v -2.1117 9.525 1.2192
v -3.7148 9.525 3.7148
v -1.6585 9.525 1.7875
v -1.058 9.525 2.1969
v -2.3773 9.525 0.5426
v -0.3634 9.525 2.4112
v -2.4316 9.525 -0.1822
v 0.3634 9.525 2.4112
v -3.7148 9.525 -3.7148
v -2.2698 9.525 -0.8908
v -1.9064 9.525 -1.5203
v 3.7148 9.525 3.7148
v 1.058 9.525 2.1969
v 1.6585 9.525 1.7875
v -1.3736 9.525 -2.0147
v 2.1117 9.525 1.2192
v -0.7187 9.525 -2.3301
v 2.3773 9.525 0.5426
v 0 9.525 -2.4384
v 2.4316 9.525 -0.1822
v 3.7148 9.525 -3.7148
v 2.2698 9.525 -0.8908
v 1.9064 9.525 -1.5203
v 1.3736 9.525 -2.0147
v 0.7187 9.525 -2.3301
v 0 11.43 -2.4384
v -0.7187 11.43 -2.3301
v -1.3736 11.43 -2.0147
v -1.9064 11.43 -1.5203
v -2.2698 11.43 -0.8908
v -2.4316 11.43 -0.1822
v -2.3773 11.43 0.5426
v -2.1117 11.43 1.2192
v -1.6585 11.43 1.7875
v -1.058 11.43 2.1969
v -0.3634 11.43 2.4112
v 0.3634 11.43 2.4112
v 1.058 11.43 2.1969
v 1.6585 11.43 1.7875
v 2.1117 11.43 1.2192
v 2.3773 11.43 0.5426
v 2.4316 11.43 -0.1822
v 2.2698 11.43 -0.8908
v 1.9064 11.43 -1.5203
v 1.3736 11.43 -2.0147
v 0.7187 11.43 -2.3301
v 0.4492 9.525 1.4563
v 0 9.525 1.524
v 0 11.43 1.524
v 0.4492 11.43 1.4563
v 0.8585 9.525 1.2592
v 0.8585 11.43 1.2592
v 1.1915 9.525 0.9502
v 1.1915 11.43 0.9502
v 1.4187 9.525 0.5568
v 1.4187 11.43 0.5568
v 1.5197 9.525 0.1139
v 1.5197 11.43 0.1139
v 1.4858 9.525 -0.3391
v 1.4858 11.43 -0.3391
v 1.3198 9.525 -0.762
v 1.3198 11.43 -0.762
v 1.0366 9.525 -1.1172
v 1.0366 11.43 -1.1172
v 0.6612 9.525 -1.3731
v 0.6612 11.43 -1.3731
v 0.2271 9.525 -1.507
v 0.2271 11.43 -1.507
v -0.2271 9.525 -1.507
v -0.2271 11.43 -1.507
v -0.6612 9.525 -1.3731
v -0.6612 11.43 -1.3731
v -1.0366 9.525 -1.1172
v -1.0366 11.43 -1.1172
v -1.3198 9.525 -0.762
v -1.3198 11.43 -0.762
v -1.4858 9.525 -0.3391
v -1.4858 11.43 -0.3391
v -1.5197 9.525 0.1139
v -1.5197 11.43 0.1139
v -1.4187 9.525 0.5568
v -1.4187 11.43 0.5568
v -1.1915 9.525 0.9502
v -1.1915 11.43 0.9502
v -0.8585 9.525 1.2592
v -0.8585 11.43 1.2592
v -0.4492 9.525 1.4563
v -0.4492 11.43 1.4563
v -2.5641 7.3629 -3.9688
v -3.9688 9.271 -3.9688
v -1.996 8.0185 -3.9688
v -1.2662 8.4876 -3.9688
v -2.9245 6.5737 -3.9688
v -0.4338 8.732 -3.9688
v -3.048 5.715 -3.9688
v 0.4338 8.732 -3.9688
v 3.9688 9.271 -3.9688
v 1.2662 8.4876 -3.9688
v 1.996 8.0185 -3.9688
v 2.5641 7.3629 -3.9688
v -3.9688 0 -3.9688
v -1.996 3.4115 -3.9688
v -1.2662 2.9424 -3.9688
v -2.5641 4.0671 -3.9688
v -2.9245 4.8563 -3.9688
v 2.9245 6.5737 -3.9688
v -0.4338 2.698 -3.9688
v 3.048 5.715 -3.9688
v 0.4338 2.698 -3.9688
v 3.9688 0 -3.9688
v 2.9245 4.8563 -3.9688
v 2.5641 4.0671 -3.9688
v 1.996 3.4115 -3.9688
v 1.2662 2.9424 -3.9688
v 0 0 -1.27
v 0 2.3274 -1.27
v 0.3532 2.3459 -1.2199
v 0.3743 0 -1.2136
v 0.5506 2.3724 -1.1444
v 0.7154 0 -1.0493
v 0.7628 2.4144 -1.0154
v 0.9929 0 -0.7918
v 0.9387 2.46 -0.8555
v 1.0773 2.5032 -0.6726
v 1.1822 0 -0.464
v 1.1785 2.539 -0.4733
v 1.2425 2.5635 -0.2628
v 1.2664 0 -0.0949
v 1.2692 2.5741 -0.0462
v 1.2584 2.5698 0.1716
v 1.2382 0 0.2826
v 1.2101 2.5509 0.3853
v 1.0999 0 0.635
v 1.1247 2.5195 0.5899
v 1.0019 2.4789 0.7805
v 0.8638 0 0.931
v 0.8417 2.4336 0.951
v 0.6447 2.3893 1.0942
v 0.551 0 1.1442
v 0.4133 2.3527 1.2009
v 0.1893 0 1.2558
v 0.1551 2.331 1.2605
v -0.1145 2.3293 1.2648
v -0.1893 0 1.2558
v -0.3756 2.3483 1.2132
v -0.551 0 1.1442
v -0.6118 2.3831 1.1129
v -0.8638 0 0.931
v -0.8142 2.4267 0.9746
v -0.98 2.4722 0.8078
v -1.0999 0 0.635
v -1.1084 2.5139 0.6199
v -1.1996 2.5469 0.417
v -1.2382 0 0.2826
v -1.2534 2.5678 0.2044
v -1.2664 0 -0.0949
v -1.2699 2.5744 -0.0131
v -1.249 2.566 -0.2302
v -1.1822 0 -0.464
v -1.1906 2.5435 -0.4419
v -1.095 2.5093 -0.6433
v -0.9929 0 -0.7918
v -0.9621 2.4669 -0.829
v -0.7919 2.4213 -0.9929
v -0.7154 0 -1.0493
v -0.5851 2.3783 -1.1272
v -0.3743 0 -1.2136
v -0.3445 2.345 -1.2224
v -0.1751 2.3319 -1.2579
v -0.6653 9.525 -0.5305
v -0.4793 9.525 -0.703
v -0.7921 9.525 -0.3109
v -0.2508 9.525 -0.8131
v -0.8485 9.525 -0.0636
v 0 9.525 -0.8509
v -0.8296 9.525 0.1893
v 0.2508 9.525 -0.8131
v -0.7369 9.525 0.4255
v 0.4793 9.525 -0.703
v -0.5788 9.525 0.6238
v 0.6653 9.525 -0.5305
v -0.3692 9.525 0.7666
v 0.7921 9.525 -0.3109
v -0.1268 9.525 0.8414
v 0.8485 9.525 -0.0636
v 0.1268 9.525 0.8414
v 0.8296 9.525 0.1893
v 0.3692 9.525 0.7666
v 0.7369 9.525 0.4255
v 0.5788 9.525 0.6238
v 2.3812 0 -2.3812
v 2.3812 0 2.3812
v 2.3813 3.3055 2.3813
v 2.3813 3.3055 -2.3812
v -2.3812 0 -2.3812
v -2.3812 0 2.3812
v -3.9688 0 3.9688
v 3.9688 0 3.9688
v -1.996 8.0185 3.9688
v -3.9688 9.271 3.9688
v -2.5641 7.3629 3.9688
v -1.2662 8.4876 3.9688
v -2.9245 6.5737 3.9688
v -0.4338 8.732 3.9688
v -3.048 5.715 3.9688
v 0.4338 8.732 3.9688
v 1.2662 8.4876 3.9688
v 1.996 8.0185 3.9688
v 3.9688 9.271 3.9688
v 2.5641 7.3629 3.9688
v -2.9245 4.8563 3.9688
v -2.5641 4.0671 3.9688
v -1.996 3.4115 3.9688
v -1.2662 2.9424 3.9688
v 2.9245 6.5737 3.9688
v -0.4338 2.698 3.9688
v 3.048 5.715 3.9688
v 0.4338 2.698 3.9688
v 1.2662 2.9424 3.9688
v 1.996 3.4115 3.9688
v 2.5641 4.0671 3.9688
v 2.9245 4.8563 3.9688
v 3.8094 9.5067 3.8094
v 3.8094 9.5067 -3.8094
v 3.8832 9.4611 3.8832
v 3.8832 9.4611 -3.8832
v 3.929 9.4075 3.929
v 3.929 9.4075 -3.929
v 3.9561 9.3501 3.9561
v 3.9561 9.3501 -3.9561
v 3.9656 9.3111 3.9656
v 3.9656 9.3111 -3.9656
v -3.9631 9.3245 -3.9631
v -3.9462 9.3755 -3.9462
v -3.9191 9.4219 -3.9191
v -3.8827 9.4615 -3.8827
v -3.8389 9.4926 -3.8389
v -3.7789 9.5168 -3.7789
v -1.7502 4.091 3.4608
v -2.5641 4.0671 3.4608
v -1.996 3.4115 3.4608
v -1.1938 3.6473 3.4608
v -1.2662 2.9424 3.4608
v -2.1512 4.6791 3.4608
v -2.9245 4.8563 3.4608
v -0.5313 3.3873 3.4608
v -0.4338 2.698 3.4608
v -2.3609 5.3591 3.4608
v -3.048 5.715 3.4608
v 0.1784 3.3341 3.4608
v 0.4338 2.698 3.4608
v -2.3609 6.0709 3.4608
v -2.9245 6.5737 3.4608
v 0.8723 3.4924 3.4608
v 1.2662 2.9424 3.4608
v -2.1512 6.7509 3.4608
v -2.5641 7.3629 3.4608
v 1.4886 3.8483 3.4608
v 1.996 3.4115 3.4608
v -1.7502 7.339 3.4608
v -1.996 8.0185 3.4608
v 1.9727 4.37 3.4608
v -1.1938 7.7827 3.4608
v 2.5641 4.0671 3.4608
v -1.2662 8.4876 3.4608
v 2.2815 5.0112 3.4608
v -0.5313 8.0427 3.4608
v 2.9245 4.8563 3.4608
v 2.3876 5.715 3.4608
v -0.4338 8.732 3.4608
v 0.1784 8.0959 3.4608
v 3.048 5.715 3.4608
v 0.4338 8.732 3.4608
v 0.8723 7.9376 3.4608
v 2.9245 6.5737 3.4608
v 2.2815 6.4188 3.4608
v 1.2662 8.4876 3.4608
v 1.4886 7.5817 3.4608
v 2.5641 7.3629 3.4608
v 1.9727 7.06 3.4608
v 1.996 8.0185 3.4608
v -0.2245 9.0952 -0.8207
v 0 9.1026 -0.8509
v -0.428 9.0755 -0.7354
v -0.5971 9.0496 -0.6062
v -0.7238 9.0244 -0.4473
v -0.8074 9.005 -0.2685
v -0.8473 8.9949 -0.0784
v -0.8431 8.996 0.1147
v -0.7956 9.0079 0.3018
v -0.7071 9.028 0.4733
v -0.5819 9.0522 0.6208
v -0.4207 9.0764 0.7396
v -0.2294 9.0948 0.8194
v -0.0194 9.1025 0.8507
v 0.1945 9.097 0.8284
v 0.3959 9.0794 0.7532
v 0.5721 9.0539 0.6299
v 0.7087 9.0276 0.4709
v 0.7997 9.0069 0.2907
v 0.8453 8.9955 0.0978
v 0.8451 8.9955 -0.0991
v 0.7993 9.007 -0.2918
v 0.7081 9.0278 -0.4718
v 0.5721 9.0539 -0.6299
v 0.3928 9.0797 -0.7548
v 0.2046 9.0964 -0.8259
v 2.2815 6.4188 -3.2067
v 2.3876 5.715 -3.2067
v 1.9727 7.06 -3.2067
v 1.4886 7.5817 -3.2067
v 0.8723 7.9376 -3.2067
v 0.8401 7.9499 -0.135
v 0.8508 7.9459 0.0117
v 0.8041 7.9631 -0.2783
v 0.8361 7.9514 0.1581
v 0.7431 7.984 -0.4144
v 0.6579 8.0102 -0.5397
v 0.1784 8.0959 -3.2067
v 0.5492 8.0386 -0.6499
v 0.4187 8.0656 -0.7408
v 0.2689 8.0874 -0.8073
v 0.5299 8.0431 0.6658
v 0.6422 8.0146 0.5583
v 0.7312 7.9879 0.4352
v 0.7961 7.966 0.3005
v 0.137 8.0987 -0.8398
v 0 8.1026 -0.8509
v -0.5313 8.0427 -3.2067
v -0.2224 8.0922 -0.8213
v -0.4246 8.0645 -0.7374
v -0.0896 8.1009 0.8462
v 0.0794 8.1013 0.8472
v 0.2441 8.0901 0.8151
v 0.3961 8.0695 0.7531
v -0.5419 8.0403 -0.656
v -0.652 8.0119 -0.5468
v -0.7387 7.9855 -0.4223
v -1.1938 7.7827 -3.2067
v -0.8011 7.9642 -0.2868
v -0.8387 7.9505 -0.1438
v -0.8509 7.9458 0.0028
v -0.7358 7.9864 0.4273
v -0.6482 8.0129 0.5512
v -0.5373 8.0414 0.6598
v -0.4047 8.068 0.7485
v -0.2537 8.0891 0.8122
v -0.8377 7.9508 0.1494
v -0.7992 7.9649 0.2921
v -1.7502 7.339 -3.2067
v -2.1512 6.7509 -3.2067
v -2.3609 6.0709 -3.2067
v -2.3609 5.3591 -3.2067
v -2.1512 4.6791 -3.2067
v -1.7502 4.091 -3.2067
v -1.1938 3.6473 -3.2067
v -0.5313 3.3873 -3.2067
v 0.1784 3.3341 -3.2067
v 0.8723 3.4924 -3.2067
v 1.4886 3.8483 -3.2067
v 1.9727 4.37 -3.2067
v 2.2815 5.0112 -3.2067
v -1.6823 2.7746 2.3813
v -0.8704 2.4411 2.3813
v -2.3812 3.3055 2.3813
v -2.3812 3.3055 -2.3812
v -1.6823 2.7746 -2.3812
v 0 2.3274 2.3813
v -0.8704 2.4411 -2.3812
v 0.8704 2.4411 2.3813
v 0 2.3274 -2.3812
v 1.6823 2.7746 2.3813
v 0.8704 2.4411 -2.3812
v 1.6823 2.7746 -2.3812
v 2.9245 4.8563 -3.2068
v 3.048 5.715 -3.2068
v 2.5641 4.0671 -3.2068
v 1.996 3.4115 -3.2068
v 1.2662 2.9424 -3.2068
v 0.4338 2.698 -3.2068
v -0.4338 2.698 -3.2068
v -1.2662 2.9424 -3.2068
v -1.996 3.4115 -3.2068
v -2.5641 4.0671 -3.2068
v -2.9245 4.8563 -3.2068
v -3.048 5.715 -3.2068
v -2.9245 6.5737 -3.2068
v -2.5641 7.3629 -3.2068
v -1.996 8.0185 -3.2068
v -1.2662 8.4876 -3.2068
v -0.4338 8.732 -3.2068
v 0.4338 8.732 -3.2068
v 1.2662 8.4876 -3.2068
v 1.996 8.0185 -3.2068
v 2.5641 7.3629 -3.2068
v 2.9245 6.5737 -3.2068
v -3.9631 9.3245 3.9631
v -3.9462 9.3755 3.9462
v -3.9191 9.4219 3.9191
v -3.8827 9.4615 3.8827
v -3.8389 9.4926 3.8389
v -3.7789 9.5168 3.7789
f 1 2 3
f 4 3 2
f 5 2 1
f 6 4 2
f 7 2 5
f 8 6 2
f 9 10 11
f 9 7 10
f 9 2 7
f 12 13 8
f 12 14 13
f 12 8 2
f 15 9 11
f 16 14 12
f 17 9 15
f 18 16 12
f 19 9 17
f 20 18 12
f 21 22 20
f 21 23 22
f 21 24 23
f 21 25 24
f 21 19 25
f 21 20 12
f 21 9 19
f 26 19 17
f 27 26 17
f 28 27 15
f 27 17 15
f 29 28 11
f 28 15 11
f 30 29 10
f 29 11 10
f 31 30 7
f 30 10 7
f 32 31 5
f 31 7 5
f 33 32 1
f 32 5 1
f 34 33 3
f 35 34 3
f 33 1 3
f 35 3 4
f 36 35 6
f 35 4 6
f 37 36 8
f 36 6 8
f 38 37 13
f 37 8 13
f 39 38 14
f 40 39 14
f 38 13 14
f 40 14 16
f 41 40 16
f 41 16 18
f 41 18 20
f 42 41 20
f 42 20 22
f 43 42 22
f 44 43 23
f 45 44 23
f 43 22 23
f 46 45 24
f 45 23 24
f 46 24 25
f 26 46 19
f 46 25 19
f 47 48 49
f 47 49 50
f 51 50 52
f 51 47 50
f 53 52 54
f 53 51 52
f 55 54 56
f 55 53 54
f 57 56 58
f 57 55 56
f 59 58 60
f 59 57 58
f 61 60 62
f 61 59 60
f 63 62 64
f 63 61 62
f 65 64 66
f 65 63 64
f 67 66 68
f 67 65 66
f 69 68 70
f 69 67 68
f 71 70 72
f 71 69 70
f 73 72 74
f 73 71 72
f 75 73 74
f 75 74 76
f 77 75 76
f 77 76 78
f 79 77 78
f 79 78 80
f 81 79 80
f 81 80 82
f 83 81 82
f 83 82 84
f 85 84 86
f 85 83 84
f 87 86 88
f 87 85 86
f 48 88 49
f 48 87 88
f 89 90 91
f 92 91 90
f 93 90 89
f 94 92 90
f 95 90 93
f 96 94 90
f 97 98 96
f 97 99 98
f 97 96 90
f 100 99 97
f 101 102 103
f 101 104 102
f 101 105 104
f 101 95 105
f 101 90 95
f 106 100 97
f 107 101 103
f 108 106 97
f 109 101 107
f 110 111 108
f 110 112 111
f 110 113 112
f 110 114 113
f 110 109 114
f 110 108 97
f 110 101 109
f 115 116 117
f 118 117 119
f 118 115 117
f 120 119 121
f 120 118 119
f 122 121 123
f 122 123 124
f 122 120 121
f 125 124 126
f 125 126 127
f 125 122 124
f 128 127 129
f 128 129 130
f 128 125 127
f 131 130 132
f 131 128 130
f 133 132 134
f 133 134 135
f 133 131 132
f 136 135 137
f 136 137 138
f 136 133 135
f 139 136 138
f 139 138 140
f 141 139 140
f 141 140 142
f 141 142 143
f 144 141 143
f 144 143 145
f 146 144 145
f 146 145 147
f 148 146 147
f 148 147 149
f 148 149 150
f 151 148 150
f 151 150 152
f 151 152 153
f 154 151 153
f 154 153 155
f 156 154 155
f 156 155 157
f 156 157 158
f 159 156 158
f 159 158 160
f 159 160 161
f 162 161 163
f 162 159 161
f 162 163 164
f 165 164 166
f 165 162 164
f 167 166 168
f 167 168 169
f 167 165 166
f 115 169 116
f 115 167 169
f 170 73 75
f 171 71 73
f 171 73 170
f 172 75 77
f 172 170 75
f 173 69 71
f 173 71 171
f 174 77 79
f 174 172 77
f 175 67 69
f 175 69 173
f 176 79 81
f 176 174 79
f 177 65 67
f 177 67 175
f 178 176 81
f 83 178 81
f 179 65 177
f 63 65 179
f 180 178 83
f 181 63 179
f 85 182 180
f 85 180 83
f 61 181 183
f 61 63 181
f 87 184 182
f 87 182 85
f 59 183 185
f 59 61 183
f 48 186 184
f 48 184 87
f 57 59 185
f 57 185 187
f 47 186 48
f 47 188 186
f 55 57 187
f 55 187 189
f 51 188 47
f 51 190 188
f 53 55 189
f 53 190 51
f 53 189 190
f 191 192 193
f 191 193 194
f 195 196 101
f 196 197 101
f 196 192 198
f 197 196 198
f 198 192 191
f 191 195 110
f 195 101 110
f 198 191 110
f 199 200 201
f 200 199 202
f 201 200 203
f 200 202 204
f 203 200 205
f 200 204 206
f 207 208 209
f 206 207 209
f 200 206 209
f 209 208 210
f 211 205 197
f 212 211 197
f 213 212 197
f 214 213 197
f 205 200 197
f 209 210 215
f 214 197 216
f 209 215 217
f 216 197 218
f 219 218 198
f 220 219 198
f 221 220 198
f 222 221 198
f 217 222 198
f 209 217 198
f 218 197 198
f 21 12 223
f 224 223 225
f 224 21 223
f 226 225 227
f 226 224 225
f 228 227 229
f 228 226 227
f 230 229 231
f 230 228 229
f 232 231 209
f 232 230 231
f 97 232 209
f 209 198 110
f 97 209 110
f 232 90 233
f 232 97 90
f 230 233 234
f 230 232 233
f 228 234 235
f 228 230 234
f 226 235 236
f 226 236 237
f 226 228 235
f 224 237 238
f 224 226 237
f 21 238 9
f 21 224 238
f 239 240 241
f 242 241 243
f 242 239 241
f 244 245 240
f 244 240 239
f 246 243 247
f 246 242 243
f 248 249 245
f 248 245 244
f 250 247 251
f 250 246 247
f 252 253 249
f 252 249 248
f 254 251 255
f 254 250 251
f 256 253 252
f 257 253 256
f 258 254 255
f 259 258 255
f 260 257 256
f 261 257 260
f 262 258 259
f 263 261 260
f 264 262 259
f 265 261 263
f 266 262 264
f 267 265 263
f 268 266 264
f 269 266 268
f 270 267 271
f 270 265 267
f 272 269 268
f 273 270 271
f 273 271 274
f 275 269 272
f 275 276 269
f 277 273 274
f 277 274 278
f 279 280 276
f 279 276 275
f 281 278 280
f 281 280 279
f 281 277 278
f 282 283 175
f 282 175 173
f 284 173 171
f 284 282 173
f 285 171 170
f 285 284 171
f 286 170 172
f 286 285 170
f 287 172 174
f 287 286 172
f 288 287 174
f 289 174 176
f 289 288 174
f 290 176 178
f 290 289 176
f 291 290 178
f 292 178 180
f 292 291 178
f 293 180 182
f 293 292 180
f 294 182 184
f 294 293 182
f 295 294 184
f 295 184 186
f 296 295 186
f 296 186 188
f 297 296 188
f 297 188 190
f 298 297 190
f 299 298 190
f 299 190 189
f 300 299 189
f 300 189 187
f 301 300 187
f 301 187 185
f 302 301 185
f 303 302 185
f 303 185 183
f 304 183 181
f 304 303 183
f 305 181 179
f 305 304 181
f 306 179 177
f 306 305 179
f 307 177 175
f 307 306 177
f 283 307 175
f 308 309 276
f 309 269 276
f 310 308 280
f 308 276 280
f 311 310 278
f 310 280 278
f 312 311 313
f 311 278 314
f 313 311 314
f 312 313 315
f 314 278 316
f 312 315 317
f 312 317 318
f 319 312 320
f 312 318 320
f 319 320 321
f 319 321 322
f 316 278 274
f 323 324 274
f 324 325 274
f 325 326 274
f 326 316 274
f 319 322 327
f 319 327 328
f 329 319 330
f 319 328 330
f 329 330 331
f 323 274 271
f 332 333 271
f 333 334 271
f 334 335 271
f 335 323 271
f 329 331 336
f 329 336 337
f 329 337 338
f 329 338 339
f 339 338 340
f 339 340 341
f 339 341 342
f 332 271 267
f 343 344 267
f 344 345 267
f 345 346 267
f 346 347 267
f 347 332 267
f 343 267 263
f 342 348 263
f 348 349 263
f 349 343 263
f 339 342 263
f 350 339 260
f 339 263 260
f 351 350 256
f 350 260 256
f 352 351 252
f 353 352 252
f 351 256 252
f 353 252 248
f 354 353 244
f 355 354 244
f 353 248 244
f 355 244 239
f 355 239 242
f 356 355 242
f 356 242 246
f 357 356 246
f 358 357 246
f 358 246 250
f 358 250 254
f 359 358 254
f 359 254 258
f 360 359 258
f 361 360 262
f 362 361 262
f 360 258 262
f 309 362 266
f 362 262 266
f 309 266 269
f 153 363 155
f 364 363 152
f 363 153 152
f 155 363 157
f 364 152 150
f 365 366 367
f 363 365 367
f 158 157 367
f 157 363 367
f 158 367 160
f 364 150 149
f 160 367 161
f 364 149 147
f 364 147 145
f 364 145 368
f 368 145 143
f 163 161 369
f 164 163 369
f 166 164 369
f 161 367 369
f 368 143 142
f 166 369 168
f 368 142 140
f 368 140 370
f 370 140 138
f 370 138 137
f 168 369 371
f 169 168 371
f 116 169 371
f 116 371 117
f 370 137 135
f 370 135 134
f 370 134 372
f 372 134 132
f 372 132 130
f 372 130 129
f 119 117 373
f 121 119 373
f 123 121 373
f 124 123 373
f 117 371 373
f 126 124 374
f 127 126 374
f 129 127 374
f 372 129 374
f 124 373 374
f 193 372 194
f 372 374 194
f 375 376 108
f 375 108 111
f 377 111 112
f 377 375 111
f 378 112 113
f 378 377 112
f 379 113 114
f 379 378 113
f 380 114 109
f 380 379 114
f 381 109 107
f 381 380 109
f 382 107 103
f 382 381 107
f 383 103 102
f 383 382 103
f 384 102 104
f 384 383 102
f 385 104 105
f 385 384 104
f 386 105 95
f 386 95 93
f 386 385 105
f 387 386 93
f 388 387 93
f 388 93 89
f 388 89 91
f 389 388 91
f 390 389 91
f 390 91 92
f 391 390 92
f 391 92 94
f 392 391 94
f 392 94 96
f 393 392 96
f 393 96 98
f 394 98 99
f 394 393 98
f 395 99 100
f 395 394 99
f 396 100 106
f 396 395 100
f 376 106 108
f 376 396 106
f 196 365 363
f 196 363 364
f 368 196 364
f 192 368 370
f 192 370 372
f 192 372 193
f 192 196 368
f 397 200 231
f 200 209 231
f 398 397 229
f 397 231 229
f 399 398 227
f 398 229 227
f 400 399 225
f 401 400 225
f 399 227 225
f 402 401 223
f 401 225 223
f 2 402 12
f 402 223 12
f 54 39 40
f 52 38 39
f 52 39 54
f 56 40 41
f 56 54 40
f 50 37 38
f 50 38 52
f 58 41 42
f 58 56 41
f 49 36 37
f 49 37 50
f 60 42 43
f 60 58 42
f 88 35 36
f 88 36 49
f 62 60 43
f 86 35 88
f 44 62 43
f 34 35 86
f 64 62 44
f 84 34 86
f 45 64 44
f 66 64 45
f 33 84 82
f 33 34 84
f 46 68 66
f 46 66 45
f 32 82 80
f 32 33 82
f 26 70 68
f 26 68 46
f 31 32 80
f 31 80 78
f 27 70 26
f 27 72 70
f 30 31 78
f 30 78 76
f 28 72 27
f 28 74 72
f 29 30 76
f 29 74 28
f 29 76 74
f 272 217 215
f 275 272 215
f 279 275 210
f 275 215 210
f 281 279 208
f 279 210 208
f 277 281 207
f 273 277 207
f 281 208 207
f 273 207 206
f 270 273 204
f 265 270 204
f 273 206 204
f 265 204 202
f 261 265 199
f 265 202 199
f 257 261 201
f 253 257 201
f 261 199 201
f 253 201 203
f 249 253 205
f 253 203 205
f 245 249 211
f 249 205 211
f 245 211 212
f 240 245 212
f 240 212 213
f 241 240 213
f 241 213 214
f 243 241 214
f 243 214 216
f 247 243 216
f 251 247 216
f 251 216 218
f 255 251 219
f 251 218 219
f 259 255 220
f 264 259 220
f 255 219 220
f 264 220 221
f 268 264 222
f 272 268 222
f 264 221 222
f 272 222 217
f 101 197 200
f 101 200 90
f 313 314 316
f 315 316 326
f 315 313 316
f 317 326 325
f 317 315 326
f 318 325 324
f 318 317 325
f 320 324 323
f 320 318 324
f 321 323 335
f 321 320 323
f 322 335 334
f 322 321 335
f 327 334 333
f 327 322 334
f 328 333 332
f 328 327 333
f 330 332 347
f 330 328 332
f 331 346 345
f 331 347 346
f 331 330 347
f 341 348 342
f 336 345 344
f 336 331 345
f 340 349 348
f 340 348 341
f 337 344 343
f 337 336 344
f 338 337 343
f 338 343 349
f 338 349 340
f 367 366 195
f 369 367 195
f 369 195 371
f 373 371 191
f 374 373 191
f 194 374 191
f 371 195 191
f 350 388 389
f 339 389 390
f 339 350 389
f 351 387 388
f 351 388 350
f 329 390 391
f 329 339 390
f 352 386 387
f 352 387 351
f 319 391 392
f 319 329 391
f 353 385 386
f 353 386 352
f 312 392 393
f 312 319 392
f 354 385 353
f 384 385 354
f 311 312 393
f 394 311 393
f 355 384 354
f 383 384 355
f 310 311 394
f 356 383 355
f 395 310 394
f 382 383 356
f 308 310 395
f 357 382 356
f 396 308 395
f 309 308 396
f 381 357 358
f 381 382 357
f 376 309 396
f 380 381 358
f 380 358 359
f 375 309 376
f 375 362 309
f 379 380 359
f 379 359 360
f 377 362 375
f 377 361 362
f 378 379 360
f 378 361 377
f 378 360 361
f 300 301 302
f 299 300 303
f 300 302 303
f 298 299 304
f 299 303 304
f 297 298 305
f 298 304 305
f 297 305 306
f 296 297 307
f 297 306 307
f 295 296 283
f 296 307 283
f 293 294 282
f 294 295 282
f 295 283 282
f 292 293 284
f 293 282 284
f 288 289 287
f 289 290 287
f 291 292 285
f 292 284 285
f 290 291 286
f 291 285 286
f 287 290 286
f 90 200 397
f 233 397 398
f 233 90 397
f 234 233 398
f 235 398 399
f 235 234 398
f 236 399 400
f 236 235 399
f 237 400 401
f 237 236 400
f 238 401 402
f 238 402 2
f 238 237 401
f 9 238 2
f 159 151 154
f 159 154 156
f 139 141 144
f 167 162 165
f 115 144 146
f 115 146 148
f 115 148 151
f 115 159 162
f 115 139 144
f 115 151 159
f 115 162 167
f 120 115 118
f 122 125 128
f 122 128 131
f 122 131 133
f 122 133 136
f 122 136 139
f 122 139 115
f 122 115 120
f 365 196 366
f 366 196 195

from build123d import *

# Parameters (mm, degrees)
SKETCH1_W                = 7.9375
SKETCH1_H                = 7.9375
BASE_EXTRUDE_DEPTH       = 9.525
SKETCH2_R                = 2.4384
BOSS_EXTRUDE1_DEPTH      = 1.905
SHELL1_T                 = -1.5875
SKETCH5_R                = 2.3876
CUT_EXTRUDE1_DEPTH       = 15.470652467
SKETCH6_R                = 3.048
CBORE1_DEPTH             = 0.508
CBORE2_START             = -0.762
SKETCH7_R                = 3.048
CBORE2_DEPTH             = 0.762
BOSS_EXTRUDE_THIN1_START = -5.842
SKETCH8_R                = 3.3876
SKETCH8_R_2              = 2.3876
BOSS_EXTRUDE_THIN1_DEPTH = 4.7625
INSDOT2_REACH            = 14.734
INSDOT2_END_RADIUS       = 3.3876
SKETCH4_R                = 1.27
CUT_EXTRUDE2_START       = -1.905
SKETCH10_R               = 1.524
CUT_EXTRUDE2_DEPTH       = 1.905
FILLET1_R                = 0.254


with BuildPart() as part:
    # Sketch1 → Base-Extrude (new body)
    with BuildSketch(Plane(origin=(0, 0, 0), x_dir=(1, 0, 0), z_dir=(0, 1, 0))):
        Rectangle(SKETCH1_W, SKETCH1_H)
    extrude(amount=BASE_EXTRUDE_DEPTH)

    # Sketch2 → Boss-Extrude1 (add)
    with BuildSketch(Plane(origin=(0, 9.525, 0), x_dir=(-1, 0, 0), z_dir=(0, 1, 0))):
        with Locations(Location((0, 0, 0), (0, 0, 270))):
            Circle(SKETCH2_R)
    extrude(amount=BOSS_EXTRUDE1_DEPTH)

    # Shell1
    shell1_openings = [part.faces().sort_by_distance(p)[0] for p in [
        (0, 0, 0),
    ]]
    offset(amount=SHELL1_T, openings=shell1_openings, kind=Kind.INTERSECTION)

    # Sketch5 → Cut-Extrude1 (cut, through all)
    with BuildSketch(Plane.XY.offset(3.96875)):
        with Locations((0, 5.715)):
            Circle(SKETCH5_R)
    extrude(amount=-CUT_EXTRUDE1_DEPTH, mode=Mode.SUBTRACT)

    # Sketch6 → cbore1 (cut)
    with BuildSketch(Plane.XY.offset(3.96875)):
        with Locations((0, 5.715)):
            Circle(SKETCH6_R)
    extrude(amount=-CBORE1_DEPTH, mode=Mode.SUBTRACT)

    # Sketch7 → cbore2 (cut)
    with BuildSketch(Plane(origin=(0, 0, -3.96875), x_dir=(-1, 0, 0), z_dir=(0, 0, -1)).offset(CBORE2_START)):
        with Locations(Location((0, 5.715, 0), (0, 0, 180))):
            Circle(SKETCH7_R)
    extrude(amount=CBORE2_DEPTH, mode=Mode.SUBTRACT)

    # Sketch8 → Boss-Extrude-Thin1 (add)
    with BuildSketch(Plane.XY.offset(3.46075).offset(BOSS_EXTRUDE_THIN1_START)):
        with Locations((0, 5.715)):
            Circle(SKETCH8_R)
        with Locations((0, 5.715)):
            Circle(SKETCH8_R_2, mode=Mode.SUBTRACT)
    extrude(amount=BOSS_EXTRUDE_THIN1_DEPTH)

    # InsDot2: up to this cylinder (the profile starts outside it)
    insdot2_end = Plane(origin=(0, 5.715, 0), z_dir=(0, 0, 1)) * Cylinder(INSDOT2_END_RADIUS, 37.2432, mode=Mode.PRIVATE)
    # Sketch4 → InsDot2 (add, up to the surface)
    with BuildSketch(Plane.XZ, mode=Mode.PRIVATE) as insdot2_sk1:
        with Locations(Location((0, 0, 0), (0, 0, 270))):
            Circle(SKETCH4_R)
    insdot2_tool1 = extrude(insdot2_sk1.sketch, amount=-INSDOT2_REACH, mode=Mode.PRIVATE) - insdot2_end
    add(insdot2_tool1.solids().sort_by_distance((0, 0, 0))[0])

    # Sketch10 → Cut-Extrude2 (cut)
    with BuildSketch(Plane(origin=(0, 11.43, 0), x_dir=(-1, 0, 0), z_dir=(0, 1, 0)).offset(CUT_EXTRUDE2_START)):
        with Locations(Location((0, 0, 0), (0, 0, 90))):
            Circle(SKETCH10_R)
    extrude(amount=CUT_EXTRUDE2_DEPTH, mode=Mode.SUBTRACT)

    # Fillet1
    fillet1_edges = [part.edges().sort_by_distance(p)[0] for p in [
        (3.96875, 9.525, 0),
        (0, 9.525, -3.96875),
        (-3.96875, 9.525, 0),
        (0, 9.525, 3.96875),
    ]]
    fillet(fillet1_edges, radius=FILLET1_R)


solid = part.part
